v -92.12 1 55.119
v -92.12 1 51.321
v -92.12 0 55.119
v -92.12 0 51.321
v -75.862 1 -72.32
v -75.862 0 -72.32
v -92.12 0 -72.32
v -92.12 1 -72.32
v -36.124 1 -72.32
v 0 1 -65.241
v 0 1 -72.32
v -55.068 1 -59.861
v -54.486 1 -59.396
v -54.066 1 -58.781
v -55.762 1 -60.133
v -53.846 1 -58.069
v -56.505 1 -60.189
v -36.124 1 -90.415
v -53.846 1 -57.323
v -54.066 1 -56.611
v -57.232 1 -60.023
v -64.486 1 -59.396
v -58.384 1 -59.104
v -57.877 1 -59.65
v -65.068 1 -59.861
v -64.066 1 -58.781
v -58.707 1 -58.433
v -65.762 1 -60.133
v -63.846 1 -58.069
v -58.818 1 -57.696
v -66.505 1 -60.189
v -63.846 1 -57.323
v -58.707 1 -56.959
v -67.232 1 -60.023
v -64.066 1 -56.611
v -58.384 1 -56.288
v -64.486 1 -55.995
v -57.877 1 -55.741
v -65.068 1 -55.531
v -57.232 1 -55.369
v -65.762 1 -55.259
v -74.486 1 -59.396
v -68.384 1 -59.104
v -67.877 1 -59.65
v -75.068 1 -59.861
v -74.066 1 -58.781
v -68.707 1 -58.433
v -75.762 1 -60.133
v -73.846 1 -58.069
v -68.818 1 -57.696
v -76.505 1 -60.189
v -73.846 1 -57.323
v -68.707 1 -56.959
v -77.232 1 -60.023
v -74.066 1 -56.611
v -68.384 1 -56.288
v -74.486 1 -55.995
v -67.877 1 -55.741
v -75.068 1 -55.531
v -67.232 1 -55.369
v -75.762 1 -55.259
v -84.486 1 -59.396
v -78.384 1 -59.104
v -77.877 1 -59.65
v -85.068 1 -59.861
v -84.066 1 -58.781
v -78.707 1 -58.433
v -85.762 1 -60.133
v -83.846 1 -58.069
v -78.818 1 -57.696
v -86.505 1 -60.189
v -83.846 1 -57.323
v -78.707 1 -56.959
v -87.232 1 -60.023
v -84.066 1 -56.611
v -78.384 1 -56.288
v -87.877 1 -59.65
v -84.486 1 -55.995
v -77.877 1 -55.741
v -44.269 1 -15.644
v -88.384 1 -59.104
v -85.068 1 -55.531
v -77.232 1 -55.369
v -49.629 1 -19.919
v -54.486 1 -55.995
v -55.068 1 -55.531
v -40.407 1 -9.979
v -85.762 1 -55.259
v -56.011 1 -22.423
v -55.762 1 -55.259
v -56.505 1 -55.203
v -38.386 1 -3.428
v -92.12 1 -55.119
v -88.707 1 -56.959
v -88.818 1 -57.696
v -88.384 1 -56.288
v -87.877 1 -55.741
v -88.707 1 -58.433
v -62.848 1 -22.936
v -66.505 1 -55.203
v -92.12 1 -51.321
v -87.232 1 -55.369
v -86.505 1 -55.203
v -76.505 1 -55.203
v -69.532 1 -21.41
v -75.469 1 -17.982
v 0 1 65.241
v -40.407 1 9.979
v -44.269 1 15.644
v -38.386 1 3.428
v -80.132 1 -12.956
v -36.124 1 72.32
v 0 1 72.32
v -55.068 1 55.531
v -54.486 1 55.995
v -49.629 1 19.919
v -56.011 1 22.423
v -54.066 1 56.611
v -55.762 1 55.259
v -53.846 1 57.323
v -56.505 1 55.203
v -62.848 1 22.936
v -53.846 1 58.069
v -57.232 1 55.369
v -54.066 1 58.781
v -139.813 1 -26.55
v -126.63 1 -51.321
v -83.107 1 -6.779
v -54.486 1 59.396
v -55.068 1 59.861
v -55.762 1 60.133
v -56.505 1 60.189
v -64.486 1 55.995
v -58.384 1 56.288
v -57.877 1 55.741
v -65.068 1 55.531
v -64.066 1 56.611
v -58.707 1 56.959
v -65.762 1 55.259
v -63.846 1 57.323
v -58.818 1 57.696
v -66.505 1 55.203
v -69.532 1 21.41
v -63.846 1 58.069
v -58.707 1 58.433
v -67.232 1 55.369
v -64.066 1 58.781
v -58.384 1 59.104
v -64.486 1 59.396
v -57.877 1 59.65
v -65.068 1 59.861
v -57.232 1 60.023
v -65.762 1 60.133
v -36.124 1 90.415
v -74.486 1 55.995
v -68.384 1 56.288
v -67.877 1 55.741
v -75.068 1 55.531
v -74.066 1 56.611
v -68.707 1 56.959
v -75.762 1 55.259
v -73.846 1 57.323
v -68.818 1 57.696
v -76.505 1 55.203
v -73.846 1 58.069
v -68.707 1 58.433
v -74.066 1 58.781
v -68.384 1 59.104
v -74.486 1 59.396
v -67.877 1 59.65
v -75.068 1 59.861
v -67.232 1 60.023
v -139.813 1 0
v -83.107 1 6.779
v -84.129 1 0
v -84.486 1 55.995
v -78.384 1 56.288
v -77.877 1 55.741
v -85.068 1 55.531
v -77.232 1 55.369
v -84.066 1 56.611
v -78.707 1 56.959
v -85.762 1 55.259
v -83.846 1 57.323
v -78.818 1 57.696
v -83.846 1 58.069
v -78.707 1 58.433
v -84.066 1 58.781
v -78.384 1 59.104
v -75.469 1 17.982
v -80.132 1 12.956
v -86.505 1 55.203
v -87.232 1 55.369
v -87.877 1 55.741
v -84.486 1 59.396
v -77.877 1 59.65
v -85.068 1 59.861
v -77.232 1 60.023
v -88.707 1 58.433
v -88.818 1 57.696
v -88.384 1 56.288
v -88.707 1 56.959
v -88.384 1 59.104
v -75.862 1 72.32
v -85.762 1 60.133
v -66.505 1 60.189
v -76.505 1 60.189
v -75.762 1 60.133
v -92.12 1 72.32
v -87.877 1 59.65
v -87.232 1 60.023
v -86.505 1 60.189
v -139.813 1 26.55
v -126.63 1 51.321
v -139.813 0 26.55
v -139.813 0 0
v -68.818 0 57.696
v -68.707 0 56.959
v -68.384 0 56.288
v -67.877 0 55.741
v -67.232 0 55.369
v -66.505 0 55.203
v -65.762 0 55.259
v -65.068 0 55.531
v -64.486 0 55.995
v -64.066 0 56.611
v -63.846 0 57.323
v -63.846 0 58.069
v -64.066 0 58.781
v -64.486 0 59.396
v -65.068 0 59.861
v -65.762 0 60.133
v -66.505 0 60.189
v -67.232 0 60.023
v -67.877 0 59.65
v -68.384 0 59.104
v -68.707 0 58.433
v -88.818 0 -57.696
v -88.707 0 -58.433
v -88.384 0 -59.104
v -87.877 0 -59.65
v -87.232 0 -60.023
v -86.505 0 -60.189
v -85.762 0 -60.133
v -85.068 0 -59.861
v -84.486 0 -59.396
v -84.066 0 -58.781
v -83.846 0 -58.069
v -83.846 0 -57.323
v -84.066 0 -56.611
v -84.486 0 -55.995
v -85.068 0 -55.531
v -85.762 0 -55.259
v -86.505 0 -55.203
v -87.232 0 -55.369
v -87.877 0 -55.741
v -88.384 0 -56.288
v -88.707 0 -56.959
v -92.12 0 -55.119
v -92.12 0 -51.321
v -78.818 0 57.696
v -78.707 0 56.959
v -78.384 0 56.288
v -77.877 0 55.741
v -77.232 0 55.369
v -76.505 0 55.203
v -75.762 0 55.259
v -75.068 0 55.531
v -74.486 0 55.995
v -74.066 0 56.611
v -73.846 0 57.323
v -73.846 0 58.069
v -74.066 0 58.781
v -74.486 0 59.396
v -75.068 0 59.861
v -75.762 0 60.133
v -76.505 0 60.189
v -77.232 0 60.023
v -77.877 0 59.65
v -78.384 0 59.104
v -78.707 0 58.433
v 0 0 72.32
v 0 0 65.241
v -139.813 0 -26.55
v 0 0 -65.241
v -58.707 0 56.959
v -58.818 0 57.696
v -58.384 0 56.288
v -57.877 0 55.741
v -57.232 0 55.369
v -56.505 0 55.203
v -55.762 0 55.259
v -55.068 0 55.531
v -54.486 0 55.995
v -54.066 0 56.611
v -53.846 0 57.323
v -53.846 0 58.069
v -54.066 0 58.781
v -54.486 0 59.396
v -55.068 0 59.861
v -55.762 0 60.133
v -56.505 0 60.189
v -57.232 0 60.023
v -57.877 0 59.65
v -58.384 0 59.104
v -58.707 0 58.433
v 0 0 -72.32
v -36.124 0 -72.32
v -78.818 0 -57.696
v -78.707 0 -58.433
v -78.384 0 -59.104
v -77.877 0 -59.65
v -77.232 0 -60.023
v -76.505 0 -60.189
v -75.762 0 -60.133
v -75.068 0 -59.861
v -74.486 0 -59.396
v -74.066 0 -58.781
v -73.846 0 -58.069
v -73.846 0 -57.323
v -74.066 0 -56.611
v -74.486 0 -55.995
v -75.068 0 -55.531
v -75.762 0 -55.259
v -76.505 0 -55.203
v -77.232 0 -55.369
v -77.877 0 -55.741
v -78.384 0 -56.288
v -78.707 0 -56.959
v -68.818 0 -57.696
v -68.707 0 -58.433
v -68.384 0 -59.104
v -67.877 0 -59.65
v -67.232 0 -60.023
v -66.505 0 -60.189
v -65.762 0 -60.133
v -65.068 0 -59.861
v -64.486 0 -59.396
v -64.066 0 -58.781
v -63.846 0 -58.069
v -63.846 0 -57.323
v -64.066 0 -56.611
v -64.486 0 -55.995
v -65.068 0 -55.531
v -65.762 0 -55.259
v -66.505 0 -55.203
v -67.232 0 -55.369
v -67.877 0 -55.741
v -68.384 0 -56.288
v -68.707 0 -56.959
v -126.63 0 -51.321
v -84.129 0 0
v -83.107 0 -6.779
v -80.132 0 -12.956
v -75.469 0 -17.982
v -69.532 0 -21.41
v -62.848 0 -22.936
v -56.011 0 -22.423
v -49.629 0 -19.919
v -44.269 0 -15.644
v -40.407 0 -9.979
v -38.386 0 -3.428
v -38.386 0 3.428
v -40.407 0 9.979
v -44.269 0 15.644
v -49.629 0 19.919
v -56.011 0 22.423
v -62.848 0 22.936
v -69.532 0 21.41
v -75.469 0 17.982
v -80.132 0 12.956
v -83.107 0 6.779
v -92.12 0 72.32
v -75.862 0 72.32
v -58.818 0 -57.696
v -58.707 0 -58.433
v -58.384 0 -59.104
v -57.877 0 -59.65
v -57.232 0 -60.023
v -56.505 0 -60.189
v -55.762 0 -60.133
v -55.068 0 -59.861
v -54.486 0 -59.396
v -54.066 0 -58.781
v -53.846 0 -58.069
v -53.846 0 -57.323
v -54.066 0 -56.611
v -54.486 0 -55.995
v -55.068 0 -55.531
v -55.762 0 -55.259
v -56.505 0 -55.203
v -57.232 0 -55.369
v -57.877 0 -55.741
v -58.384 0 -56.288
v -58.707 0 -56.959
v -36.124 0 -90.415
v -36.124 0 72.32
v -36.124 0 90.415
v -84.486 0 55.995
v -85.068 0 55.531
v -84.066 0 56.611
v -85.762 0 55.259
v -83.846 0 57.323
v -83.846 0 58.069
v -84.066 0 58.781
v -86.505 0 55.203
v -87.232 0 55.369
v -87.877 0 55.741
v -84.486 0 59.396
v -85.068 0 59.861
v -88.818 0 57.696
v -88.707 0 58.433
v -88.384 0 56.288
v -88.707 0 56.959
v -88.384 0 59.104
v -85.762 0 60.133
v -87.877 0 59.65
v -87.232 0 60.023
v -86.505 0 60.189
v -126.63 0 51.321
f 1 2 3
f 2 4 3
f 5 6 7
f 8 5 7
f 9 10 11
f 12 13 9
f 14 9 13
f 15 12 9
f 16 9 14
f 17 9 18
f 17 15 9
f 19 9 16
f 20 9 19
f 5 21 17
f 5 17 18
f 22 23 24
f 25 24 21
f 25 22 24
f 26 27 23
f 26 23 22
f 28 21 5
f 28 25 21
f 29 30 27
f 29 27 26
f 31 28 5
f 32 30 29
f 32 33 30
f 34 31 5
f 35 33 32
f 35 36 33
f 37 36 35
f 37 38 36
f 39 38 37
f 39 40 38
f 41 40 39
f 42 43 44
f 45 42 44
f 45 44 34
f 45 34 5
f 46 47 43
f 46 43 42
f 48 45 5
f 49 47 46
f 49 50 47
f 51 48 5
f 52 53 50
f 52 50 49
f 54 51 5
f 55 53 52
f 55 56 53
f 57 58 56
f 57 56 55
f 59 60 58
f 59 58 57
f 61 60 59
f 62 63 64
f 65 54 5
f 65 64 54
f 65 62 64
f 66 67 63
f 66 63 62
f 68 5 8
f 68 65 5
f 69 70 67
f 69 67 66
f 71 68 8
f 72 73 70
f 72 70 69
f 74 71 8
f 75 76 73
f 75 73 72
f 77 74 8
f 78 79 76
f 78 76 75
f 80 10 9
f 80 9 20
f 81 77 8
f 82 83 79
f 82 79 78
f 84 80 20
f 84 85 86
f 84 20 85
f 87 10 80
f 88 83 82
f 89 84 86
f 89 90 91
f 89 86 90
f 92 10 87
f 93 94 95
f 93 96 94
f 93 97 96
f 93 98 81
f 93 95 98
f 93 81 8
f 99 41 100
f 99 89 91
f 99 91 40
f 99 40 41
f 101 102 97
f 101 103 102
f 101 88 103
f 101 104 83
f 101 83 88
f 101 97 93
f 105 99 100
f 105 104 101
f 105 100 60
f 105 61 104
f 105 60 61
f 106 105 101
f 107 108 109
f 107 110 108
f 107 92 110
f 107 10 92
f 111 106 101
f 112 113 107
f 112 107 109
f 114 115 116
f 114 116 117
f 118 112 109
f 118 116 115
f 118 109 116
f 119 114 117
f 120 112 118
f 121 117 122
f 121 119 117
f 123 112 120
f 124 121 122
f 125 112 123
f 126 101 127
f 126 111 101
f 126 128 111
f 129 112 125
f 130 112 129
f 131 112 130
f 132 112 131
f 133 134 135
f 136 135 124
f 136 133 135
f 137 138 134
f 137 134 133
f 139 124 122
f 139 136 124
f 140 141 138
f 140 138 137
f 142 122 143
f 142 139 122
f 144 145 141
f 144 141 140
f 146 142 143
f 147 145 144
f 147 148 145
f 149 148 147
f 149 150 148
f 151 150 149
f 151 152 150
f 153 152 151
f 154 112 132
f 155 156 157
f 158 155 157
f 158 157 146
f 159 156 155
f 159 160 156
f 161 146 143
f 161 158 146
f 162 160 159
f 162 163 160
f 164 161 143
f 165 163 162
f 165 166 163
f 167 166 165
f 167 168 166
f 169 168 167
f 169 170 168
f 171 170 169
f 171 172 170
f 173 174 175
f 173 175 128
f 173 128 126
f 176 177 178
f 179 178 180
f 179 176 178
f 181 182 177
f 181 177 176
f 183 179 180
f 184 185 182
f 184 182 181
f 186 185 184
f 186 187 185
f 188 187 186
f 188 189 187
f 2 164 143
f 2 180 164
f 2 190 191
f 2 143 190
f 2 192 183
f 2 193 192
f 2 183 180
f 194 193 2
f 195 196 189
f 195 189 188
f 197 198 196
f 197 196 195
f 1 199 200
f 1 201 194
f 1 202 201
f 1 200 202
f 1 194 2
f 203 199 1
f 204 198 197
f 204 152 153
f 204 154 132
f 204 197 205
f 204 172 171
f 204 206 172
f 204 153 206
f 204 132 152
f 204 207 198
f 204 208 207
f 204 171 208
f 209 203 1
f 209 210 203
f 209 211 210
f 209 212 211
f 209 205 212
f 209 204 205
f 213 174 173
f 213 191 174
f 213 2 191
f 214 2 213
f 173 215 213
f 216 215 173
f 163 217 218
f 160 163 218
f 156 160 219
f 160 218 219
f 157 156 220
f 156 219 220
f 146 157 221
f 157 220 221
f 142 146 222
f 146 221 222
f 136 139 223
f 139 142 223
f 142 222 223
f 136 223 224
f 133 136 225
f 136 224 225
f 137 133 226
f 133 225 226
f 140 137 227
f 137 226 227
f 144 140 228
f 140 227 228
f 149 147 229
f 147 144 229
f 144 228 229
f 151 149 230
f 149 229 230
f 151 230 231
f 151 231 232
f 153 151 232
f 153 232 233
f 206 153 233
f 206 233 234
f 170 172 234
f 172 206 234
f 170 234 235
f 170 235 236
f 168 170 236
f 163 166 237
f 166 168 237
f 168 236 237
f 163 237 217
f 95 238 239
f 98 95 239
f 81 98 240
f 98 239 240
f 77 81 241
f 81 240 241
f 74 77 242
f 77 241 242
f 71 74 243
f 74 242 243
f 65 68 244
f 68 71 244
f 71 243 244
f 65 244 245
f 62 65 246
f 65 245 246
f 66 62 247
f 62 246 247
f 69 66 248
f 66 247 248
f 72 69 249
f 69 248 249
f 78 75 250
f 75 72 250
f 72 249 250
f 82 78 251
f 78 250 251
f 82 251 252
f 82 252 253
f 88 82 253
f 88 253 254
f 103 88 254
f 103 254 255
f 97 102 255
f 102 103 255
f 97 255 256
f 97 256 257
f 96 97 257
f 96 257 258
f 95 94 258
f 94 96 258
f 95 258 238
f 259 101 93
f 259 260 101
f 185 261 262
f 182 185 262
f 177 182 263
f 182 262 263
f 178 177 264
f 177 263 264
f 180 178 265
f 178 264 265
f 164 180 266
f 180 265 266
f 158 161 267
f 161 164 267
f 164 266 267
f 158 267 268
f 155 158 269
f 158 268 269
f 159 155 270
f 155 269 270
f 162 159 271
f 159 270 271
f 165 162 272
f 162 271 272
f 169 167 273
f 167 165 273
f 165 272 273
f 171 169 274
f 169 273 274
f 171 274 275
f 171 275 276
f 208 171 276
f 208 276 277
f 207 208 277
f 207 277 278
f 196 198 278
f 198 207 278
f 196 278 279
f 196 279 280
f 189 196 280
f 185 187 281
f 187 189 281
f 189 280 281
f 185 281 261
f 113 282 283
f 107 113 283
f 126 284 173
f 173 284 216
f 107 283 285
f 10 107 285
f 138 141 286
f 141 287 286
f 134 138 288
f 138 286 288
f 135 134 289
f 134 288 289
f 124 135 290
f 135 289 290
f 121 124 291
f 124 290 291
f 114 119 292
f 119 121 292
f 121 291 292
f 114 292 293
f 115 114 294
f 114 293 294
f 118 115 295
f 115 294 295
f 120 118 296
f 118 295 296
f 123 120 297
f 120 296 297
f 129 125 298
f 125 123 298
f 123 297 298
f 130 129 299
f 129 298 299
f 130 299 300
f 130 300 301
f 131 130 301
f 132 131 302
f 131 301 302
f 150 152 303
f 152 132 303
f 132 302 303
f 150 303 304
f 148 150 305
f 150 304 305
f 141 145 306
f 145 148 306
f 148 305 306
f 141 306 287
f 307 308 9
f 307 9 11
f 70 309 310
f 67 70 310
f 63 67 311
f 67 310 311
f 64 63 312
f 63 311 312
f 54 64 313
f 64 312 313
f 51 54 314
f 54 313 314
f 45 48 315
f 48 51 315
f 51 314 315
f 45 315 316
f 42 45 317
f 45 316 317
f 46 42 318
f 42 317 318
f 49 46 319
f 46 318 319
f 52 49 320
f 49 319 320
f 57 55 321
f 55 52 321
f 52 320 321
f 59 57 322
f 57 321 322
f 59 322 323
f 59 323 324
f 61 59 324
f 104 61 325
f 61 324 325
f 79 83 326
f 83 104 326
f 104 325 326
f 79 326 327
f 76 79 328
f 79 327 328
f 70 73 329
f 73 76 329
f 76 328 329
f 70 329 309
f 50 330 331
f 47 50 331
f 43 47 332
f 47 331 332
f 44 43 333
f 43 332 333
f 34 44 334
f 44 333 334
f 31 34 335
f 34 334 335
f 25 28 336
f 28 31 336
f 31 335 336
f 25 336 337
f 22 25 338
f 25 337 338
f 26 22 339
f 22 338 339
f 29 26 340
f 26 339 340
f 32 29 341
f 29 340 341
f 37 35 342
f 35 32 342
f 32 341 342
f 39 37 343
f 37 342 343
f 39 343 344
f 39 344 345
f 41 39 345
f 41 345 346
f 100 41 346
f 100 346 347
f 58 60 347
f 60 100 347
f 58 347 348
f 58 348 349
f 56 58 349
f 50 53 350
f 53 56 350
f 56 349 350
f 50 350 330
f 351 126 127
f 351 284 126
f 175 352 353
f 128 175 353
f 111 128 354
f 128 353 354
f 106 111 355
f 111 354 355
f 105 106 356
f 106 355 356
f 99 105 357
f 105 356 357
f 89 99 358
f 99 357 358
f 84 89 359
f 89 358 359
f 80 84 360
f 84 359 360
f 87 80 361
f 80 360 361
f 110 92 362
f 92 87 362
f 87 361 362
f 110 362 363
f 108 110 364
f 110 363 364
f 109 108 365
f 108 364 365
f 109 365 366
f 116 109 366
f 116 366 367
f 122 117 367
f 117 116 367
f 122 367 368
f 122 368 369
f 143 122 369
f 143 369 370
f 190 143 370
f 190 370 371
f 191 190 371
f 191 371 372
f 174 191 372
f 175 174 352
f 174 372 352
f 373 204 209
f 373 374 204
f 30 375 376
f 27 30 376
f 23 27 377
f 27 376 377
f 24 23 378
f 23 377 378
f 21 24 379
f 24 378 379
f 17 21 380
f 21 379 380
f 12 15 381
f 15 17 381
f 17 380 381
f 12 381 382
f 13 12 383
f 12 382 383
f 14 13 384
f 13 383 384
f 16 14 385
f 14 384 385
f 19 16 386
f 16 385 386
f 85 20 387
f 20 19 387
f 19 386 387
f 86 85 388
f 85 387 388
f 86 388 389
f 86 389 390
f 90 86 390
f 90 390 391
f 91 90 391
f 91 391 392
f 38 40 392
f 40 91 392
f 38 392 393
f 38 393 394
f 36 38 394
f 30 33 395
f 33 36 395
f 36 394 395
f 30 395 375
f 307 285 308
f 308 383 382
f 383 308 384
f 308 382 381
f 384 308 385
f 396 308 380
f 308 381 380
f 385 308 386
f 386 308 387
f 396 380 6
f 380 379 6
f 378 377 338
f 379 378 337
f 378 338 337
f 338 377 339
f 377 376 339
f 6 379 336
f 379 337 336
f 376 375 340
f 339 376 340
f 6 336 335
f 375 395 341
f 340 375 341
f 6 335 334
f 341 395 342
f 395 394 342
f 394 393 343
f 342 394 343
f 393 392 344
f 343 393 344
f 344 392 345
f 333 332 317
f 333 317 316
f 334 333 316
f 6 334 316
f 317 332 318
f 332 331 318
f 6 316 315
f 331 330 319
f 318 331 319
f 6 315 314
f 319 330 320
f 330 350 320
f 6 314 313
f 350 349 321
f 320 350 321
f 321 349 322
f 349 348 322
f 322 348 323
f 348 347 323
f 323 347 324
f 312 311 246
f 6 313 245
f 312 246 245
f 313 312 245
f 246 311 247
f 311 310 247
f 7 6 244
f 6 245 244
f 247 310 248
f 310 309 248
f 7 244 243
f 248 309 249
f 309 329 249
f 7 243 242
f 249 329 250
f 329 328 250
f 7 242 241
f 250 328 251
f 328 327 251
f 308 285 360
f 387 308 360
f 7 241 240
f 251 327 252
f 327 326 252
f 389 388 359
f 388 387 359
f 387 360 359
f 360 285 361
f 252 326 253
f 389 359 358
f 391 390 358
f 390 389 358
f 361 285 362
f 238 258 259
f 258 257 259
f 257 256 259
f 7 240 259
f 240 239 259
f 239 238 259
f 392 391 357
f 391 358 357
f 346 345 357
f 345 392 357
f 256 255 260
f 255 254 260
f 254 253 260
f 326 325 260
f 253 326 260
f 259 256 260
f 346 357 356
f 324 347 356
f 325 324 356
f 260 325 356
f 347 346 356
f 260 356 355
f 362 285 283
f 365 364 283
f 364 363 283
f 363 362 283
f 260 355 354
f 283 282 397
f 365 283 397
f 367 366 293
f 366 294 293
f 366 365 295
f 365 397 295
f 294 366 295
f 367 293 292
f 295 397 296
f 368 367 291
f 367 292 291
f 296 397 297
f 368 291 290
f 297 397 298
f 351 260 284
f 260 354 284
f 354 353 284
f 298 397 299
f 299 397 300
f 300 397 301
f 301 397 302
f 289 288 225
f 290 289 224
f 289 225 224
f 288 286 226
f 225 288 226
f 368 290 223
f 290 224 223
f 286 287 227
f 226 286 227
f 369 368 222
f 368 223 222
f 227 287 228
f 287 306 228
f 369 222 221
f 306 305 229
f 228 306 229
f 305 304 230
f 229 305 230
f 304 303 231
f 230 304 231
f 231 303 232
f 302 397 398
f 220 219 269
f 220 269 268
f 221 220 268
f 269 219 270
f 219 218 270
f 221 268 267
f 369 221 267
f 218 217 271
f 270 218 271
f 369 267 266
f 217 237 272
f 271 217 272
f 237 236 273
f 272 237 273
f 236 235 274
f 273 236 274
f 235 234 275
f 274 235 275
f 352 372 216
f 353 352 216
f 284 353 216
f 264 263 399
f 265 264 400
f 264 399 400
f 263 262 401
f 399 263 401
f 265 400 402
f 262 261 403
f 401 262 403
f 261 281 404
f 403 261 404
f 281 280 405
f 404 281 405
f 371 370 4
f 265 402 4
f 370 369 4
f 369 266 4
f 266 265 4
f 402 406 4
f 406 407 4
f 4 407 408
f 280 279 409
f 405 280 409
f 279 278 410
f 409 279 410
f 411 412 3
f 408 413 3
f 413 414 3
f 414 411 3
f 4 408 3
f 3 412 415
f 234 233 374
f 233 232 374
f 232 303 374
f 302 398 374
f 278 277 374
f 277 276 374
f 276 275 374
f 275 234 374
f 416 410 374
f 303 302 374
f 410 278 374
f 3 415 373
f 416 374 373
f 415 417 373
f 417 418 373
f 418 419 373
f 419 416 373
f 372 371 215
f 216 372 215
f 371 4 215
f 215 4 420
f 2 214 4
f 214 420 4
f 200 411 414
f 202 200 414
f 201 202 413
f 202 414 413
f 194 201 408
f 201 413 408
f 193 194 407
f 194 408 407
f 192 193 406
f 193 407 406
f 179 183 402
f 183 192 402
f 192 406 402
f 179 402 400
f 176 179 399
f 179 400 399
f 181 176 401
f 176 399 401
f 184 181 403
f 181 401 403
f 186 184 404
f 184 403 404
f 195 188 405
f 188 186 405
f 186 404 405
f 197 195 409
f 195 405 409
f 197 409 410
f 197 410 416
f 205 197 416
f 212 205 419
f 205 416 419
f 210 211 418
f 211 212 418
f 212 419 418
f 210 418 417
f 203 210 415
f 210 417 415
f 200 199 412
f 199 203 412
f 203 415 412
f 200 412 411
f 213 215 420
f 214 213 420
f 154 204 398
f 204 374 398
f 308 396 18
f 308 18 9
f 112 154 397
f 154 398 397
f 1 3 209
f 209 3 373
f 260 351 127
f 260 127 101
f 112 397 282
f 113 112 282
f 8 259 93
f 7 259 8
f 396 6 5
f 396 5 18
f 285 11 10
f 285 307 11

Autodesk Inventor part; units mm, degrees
ref_plane "YZ Plane" through (0, 0, 0) normal (1, 0, 0) x (0, 1, 0)
ref_plane "XZ Plane" through (0, 0, 0) normal (0, 1, 0) x (-1, 0, 0)
ref_plane "XY Plane" through (0, 0, 0) normal (0, 0, 1) x (1, 0, 0)
sketch "Esboço1" plane through (0, 0, 0) normal (0, 1, 0) x (-1, 0, 0)
  line L0 (139.8134, -26.55) -> (126.6305, -51.3208)
  line L1 (139.8134, -26.55) -> (139.8134, 0)
  line L2 (139.8134, -26.55) -> (126.6305, -51.3208)
  circle A0 centre (61.129, 0) radius 23
  circle A1 centre (56.3183, -57.6959) radius 2.5
  circle A2 centre (76.3183, -57.6959) radius 2.5
  circle A3 centre (86.3183, -57.6959) radius 2.5
  circle A4 centre (66.3183, -57.6959) radius 2.5
  line L3 (92.1195, -55.1192) -> (92.1195, -72.3197)
  line L4 (75.8622, -72.3197) -> (92.1195, -72.3197)
  line L5 (36.1237, -90.4148) -> (36.1237, -72.3197)
  line L6 (75.8622, -72.3197) -> (36.1237, -90.4148)
  line L7 (126.6305, -51.3208) -> (92.1195, -51.3208)
  line L8 (92.1195, -51.3208) -> (92.1195, -55.1192)
  line L9 (139.8134, 26.55) -> (126.6305, 51.3208)
  line L10 (139.8134, 26.55) -> (139.8134, 0)
  circle A5 centre (76.3183, 57.6959) radius 2.5
  circle A6 centre (86.3183, 57.6959) radius 2.5
  circle A7 centre (66.3183, 57.6959) radius 2.5
  circle A8 centre (56.3183, 57.6959) radius 2.5
  line L11 (92.1195, 55.1192) -> (92.1195, 72.3197)
  line L12 (75.8622, 72.3197) -> (92.1195, 72.3197)
  line L13 (36.1237, 90.4148) -> (36.1237, 72.3197)
  line L14 (75.8622, 72.3197) -> (36.1237, 90.4148)
  line L15 (126.6305, 51.3208) -> (92.1195, 51.3208)
  line L16 (92.1195, 51.3208) -> (92.1195, 55.1192)
  line L17 (0, 65.2411) -> (0, -65.2411)
  line L18 (36.1237, 72.3197) -> (0, 72.3197)
  line L19 (0, 72.3197) -> (0, 65.2411)
  line L20 (36.1237, -72.3197) -> (0, -72.3197)
  line L21 (0, -72.3197) -> (0, -65.2411)
  point P0 (0, 0)
  dimension "d1" = 46
  dimension "d6" = 130.4821
extrude "Extrusão1" add sketch "Esboço1" along normal blind 1
properties part number "base_1"
